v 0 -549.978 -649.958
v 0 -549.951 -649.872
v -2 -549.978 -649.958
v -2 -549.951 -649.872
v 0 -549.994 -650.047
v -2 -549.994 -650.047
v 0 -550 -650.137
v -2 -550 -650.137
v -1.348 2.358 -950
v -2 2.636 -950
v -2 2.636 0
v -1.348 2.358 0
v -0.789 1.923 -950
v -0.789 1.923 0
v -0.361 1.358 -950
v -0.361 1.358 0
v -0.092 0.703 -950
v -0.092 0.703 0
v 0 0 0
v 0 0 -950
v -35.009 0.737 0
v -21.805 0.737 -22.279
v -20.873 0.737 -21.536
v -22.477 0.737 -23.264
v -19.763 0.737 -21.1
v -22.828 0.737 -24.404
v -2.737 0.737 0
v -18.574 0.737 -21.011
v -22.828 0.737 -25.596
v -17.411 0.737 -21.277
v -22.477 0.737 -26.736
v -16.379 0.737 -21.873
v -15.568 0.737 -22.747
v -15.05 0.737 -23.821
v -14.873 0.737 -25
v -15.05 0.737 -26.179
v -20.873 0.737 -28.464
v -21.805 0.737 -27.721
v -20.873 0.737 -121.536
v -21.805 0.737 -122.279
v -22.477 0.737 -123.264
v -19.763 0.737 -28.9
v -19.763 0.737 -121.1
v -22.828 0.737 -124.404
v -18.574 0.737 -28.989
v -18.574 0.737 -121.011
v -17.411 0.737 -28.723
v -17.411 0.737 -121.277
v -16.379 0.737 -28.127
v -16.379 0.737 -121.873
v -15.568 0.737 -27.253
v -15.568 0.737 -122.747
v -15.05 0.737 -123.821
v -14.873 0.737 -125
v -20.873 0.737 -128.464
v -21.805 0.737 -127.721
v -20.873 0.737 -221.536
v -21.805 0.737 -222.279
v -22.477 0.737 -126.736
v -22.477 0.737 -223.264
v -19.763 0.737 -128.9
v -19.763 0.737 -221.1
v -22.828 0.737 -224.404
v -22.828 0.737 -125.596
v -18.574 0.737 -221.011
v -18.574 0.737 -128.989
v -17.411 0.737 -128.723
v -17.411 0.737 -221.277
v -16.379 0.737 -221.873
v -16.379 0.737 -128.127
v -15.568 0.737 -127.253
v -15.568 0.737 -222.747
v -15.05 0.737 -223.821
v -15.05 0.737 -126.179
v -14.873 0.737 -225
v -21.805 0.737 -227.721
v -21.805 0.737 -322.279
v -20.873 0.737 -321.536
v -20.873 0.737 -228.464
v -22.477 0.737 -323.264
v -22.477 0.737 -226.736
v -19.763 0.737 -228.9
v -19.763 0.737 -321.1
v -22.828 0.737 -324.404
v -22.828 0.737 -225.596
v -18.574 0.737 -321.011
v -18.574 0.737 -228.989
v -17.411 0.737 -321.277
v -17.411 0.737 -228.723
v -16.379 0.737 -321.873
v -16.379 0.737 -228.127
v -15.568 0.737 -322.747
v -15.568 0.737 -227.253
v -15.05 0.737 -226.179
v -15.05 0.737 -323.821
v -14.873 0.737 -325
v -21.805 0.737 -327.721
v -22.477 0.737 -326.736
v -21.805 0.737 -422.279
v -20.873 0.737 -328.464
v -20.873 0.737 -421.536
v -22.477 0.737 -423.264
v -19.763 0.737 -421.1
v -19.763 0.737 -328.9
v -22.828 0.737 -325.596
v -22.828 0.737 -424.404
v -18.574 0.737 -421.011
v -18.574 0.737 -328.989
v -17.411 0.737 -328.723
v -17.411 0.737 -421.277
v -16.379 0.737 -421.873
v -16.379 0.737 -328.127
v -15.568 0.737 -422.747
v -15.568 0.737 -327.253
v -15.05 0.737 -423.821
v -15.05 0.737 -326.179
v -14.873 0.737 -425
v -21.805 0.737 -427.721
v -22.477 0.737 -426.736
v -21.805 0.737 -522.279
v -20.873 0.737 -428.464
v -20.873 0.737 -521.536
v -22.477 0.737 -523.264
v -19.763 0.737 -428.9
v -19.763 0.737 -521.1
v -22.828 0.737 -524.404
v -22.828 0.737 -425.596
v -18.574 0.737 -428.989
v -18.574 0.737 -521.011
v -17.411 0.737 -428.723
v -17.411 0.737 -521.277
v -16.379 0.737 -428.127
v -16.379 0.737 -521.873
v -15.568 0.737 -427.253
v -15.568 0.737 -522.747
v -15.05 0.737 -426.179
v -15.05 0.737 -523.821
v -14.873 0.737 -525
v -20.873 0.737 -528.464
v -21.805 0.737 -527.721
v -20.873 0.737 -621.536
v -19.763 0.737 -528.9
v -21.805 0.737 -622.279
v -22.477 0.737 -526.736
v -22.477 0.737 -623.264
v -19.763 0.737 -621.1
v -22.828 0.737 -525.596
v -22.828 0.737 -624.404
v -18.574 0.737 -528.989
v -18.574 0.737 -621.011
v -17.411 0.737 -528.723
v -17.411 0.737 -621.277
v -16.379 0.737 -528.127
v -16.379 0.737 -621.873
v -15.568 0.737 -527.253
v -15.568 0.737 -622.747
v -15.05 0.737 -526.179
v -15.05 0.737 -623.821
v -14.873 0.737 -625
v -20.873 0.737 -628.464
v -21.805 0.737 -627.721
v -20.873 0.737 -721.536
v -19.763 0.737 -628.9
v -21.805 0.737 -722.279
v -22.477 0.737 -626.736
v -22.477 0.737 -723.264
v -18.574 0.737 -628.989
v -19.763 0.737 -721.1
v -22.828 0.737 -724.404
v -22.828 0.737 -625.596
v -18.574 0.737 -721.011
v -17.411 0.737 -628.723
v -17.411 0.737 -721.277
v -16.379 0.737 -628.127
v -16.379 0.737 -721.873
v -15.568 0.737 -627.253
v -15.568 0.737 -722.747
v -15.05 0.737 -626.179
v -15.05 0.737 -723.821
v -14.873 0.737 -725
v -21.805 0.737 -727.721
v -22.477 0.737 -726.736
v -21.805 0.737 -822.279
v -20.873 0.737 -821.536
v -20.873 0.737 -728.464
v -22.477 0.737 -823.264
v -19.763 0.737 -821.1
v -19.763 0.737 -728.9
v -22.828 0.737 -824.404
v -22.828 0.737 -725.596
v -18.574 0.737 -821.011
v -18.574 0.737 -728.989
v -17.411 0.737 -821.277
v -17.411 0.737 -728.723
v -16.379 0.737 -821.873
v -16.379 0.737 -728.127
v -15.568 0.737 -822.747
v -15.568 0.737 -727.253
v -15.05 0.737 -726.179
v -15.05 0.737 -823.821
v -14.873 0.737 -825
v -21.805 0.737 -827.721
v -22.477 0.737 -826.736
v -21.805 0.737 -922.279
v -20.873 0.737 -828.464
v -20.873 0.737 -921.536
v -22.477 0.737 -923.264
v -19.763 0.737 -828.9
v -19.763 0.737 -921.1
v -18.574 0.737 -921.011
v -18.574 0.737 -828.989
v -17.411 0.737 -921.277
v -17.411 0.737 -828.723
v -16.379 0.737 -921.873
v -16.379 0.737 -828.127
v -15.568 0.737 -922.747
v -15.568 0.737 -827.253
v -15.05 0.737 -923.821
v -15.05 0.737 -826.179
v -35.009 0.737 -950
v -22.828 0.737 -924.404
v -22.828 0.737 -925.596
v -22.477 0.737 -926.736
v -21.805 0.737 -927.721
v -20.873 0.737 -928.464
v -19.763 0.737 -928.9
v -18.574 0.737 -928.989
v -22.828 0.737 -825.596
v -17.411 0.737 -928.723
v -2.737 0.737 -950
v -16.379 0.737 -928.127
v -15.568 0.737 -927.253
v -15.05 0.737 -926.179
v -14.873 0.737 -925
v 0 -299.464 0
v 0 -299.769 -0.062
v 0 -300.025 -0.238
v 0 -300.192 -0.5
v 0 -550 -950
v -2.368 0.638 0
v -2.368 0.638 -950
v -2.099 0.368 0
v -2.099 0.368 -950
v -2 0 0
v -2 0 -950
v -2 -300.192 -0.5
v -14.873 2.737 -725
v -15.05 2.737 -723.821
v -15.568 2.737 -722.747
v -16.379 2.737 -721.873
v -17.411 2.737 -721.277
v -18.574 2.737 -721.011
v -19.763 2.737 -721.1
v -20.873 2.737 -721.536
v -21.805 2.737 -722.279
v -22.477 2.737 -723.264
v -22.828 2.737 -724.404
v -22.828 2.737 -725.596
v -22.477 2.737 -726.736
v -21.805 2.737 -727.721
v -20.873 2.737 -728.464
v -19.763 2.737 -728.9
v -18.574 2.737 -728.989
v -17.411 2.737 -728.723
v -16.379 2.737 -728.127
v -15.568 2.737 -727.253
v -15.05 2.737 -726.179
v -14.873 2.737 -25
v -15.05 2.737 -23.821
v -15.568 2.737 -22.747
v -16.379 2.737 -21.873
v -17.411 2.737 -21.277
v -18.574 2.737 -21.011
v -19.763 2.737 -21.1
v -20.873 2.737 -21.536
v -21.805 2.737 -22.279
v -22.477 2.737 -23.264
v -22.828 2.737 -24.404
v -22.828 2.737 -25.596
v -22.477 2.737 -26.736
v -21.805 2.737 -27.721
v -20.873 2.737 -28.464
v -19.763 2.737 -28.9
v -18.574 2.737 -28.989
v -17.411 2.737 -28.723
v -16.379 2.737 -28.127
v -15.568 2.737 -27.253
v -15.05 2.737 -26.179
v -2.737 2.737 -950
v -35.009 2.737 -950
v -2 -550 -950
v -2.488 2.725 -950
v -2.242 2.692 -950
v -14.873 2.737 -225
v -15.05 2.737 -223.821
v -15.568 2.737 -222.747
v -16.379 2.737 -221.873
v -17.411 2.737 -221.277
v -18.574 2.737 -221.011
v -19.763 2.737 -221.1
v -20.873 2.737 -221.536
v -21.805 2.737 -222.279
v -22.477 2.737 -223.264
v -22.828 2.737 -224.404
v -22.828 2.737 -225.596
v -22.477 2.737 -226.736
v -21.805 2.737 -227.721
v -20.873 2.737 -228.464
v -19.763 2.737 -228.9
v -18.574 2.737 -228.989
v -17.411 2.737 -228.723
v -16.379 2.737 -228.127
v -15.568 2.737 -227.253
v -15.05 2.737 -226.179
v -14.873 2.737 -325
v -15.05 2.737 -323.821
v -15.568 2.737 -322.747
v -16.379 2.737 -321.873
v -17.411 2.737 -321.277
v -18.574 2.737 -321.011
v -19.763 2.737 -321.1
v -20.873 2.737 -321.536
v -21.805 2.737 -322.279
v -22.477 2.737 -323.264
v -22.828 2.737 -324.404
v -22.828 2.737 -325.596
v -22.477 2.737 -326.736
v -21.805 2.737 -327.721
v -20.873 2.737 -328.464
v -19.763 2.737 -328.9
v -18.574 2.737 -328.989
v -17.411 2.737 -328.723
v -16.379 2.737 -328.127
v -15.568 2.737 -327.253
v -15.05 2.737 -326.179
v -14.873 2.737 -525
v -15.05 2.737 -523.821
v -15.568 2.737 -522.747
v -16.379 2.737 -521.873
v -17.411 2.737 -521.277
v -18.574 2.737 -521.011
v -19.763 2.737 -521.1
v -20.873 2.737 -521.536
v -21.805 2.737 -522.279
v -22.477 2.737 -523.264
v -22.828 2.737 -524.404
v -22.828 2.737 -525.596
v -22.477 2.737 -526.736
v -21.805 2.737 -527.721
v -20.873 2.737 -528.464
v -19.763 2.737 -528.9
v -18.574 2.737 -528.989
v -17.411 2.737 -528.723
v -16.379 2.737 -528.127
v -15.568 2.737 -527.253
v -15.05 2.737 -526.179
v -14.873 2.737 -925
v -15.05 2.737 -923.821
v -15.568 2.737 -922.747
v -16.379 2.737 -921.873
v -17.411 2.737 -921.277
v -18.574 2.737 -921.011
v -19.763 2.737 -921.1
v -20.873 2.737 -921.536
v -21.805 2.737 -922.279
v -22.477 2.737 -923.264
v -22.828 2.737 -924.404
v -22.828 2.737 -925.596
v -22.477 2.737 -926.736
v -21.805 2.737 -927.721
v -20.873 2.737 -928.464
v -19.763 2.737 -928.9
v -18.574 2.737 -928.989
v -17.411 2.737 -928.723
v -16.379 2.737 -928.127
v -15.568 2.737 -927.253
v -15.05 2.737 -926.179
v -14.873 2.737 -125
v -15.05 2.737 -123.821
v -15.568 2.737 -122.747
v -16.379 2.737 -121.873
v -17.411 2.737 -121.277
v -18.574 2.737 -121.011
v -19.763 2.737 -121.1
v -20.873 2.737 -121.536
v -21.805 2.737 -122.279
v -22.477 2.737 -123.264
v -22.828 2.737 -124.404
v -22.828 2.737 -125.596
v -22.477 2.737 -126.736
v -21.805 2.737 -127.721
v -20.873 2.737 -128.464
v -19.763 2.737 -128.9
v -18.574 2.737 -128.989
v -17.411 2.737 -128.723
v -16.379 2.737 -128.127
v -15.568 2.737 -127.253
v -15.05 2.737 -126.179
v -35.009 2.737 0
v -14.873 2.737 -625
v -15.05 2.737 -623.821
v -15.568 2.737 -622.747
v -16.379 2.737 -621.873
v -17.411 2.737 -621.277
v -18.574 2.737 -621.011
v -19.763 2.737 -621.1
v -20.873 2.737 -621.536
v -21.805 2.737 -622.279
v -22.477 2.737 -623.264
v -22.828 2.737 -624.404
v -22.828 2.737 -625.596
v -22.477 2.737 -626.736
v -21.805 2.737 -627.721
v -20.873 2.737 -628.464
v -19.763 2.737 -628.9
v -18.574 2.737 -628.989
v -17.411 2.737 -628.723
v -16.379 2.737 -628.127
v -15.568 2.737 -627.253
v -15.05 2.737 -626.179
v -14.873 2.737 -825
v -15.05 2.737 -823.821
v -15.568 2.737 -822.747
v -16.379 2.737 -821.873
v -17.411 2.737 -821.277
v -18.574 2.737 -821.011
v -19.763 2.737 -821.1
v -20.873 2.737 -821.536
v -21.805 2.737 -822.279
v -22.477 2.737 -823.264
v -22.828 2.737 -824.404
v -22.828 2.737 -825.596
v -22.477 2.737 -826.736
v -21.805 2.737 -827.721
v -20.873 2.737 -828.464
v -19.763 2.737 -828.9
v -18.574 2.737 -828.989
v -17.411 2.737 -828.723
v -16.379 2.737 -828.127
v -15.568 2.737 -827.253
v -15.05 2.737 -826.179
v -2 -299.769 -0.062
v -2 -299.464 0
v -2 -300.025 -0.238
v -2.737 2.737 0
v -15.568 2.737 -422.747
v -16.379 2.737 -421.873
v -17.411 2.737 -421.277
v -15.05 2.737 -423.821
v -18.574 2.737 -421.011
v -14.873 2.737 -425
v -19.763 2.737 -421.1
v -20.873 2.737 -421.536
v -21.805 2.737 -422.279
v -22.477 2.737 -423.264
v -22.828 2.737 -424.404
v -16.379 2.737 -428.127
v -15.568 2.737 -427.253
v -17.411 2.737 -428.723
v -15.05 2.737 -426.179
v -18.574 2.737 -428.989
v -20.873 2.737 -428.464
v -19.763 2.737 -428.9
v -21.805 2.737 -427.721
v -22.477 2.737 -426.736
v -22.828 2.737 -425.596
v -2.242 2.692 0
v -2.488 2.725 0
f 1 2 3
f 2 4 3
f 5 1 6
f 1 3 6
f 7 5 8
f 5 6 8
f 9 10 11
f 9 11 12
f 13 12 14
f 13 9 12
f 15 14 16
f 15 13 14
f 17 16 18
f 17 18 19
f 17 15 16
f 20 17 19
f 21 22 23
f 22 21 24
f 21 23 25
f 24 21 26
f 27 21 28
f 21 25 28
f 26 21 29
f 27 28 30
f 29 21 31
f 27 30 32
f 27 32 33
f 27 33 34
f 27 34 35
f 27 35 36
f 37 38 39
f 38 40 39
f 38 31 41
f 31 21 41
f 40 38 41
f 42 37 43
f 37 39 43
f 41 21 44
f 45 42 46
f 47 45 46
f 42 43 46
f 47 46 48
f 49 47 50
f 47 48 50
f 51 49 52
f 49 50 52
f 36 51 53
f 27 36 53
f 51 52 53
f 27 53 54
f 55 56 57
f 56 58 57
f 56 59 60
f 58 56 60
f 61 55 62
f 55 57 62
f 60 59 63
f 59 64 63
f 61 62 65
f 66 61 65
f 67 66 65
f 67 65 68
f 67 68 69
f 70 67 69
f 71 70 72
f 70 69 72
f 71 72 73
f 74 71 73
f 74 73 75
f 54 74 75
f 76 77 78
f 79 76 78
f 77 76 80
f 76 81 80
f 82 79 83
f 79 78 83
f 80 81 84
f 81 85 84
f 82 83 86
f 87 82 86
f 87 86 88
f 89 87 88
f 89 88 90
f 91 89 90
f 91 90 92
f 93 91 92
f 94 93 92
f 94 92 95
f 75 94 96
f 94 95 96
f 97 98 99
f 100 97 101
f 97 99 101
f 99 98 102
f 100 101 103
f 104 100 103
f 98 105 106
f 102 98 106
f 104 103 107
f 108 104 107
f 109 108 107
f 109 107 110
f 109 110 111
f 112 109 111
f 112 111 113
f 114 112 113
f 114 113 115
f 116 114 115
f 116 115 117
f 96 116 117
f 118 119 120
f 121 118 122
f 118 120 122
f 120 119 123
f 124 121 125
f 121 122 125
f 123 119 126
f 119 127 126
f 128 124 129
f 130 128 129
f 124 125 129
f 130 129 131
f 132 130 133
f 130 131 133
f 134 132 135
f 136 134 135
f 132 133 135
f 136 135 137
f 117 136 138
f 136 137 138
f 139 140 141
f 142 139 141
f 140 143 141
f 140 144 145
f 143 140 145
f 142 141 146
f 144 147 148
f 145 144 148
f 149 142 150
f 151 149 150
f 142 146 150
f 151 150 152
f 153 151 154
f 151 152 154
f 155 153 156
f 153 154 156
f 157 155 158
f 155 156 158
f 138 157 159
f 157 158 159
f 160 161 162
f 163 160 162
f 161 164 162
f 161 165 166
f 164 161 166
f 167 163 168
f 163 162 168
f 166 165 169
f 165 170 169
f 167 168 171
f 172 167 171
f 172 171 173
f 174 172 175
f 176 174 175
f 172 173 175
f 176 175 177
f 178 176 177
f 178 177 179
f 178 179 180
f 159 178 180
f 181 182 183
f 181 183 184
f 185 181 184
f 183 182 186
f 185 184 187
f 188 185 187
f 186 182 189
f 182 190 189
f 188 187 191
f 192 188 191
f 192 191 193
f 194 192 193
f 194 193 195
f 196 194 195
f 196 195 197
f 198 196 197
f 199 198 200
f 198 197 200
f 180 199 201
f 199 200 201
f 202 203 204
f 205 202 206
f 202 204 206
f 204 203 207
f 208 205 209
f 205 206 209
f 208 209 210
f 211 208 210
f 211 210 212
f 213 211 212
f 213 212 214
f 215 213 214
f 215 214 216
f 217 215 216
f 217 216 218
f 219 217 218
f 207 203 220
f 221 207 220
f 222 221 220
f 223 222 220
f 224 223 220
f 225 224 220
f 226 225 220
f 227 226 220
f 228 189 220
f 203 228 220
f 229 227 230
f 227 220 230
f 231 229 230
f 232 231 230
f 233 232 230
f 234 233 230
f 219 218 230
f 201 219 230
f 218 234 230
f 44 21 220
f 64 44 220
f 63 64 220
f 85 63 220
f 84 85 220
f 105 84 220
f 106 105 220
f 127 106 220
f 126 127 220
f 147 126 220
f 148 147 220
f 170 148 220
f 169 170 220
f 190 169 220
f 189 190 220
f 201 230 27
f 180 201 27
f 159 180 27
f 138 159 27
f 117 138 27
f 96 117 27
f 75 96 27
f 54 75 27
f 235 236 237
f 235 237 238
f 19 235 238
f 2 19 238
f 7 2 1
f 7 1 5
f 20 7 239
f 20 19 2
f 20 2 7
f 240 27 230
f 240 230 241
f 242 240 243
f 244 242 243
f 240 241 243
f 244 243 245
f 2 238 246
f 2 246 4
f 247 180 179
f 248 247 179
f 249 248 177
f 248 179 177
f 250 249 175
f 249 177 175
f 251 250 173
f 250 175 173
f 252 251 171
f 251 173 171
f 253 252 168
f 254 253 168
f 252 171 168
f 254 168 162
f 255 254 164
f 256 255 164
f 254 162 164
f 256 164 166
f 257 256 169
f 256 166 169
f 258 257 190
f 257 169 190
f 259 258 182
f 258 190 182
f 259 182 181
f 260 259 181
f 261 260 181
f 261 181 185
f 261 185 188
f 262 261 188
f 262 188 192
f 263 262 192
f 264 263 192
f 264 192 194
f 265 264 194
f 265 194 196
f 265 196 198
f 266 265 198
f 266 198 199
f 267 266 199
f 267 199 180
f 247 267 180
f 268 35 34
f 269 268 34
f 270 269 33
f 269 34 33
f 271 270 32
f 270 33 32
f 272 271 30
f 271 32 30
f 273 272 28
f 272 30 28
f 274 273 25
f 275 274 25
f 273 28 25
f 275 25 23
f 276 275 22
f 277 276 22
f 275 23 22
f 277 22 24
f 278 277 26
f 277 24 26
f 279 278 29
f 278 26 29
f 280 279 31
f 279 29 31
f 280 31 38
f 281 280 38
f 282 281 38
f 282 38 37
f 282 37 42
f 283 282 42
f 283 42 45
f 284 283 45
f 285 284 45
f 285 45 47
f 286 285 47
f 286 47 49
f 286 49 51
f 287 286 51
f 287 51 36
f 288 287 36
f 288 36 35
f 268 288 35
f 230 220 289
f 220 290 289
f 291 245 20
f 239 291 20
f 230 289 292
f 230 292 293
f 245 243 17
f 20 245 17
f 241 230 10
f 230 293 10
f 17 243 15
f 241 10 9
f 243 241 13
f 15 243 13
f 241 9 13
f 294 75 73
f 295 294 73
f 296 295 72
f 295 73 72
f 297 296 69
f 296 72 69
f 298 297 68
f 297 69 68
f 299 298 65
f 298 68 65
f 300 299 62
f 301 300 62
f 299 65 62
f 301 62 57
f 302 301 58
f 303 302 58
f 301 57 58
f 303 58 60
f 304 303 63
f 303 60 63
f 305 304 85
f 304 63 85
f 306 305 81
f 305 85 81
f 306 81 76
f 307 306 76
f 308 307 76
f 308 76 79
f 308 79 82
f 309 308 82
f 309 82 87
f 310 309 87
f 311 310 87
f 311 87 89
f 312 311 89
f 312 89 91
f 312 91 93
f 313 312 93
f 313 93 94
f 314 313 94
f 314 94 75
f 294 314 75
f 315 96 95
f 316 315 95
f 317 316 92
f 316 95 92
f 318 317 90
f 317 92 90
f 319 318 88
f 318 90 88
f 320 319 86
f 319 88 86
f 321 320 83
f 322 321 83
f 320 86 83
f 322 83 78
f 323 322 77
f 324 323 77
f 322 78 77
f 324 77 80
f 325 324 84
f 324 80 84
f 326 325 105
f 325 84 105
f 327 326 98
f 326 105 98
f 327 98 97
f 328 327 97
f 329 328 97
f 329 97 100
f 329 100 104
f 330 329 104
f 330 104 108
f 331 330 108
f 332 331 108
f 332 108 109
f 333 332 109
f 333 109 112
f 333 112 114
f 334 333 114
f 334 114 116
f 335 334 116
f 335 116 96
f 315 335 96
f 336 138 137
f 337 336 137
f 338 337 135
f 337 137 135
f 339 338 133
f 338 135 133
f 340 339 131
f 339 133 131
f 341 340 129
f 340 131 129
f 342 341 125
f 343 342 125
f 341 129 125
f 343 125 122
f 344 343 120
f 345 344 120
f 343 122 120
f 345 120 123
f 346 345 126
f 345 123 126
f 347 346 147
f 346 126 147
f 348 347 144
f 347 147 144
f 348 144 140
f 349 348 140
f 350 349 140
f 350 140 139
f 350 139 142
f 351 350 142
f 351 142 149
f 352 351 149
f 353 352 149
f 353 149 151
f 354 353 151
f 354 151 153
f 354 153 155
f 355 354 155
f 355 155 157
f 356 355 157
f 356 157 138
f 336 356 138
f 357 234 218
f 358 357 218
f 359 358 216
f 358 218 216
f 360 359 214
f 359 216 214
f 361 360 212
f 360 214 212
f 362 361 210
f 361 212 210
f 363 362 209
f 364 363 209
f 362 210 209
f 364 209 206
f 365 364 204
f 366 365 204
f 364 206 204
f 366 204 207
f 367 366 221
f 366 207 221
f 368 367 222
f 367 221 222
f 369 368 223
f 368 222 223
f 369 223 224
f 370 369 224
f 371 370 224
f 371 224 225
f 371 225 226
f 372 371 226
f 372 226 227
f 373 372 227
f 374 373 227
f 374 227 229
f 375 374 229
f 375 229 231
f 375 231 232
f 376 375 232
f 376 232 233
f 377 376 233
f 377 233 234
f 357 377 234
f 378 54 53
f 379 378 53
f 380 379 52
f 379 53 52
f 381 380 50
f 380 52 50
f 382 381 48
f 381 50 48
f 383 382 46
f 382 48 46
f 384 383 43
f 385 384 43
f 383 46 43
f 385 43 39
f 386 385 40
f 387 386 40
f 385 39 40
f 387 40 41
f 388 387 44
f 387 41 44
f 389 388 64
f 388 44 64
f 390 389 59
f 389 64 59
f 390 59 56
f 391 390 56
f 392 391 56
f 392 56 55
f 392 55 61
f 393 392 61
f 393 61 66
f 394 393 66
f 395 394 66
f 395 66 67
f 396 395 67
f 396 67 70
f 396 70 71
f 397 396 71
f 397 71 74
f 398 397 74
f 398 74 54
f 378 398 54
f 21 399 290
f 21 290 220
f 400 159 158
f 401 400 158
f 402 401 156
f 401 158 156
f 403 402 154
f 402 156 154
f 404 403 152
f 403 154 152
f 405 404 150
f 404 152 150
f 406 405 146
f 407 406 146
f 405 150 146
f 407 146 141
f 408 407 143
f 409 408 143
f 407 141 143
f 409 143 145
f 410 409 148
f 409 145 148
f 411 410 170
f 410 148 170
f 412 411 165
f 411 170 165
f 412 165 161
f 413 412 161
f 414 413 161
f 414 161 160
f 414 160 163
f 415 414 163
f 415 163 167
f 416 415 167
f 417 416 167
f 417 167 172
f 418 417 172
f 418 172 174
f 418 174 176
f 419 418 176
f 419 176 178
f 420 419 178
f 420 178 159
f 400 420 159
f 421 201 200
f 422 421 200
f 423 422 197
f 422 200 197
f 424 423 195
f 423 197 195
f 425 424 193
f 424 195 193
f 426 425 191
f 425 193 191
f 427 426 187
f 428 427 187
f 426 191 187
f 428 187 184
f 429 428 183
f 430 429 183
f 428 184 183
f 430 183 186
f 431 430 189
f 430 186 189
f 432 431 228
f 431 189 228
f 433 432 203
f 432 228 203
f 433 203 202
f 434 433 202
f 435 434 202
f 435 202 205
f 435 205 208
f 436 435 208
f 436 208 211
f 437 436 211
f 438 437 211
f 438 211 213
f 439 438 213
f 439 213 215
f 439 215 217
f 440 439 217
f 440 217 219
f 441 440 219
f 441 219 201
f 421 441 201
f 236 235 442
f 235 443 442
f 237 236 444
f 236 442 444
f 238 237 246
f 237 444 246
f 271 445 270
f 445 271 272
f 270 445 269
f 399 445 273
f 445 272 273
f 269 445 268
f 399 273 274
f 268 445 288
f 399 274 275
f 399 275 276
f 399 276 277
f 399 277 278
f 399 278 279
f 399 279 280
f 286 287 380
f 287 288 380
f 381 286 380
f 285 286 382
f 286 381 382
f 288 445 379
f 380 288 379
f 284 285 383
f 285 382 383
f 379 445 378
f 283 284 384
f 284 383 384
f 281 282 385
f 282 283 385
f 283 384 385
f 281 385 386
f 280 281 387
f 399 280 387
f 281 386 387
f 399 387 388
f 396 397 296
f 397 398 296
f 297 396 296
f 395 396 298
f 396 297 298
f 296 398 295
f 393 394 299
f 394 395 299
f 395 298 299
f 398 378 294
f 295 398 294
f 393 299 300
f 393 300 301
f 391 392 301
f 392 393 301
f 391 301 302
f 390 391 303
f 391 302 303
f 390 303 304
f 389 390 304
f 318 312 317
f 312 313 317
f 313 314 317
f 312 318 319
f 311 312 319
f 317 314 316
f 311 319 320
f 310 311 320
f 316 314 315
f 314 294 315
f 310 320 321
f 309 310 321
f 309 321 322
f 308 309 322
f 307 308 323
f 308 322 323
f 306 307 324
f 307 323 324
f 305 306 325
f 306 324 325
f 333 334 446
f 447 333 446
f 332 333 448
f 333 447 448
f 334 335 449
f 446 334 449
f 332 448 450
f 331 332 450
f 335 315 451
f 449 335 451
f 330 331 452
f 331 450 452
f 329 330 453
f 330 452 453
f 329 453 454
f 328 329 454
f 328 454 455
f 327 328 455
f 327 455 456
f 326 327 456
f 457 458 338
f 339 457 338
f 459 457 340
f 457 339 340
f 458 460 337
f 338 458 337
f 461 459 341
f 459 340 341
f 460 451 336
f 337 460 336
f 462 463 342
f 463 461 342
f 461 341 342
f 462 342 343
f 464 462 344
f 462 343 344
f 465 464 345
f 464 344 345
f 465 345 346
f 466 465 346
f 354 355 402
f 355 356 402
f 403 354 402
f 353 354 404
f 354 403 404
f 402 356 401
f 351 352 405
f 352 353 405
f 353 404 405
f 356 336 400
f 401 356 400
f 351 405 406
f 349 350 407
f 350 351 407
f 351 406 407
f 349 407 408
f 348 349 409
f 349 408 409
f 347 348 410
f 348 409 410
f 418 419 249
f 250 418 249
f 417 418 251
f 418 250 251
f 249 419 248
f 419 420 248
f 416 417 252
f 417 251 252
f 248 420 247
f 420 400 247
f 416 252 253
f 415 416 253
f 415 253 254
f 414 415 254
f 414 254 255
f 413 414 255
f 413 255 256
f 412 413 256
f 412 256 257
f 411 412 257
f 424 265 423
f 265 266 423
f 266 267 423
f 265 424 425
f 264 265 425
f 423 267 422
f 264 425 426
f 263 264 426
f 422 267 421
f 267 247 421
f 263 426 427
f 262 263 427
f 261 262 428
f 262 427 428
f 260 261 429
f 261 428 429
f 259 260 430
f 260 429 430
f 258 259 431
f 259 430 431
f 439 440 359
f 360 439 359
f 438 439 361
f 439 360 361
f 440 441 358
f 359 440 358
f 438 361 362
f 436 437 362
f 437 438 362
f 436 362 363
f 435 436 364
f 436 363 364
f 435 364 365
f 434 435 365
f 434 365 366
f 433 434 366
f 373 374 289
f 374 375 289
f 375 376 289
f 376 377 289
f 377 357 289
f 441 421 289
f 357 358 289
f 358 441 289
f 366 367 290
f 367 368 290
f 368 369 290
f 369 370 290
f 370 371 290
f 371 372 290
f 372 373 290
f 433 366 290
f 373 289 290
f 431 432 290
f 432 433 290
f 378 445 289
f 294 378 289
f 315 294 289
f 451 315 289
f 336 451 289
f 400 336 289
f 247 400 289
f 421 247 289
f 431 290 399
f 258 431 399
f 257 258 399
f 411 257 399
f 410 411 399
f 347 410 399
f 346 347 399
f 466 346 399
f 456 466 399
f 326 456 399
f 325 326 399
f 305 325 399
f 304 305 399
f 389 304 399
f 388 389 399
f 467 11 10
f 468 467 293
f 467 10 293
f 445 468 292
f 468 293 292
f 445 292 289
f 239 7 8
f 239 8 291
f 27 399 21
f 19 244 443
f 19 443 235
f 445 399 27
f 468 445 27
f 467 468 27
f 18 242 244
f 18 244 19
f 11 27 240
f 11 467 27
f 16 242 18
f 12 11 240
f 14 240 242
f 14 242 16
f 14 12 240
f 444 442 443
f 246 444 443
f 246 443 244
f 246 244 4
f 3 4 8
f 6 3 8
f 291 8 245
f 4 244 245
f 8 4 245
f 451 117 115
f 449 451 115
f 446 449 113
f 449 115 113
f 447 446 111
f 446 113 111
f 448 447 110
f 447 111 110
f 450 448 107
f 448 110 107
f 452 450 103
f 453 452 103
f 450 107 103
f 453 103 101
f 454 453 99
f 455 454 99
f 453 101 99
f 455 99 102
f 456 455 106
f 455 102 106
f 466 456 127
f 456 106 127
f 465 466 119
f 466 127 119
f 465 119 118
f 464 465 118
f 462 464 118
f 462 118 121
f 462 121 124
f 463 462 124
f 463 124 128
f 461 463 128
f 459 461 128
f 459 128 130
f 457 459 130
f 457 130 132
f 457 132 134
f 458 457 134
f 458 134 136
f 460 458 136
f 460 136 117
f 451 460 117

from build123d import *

# Parameters (mm, degrees)
BASE_FLANGE1_DEPTH     = 2
TAB1_START             = -2
TAB1_OUTLINE_W         = 950
TAB1_OUTLINE_H         = 35
TAB1_DEPTH             = 2
SKETCHED_START         = -950
SKETCHED_BEND1_DEPTH   = 950
SKETCHED_BEND1_2_DEPTH = 950
FILLET1_R              = 0.78
FILLET2_R              = 0.74
SKETCH10_R             = 4
CUT_EXTRUDE1_DEPTH     = 10


# Read off the part's stored shape, not the designer's step: Tab1, Sketched Bend1
# Sheet-metal steps are written as plain solids
with BuildPart() as part:
    # Sketch1 → Base-Flange1 (new body)
    with BuildSketch(Plane(origin=(0, 0, 0), x_dir=(0, 0, -1), z_dir=(1, 0, 0))):
        Polygon((0, 0), (0, -300), (650, -550), (950, -550), (950, 0), align=None)
    extrude(amount=-BASE_FLANGE1_DEPTH)

    # Tab1 outline → Tab1 (add)
    with BuildSketch(Plane(origin=(0, 0, 0), x_dir=(0, 0, -1), z_dir=(1, 0, 0)).offset(TAB1_START)):
        with Locations((475, 17.5)):
            Rectangle(TAB1_OUTLINE_W, TAB1_OUTLINE_H)
    extrude(amount=TAB1_DEPTH)

    # Sketched Bend1 outline → Sketched Bend1 (cut)
    with BuildSketch(Plane.XY.offset(SKETCHED_START)):
        with BuildLine():
            Line((-2, 35), (-2, 2.635602398))
            ThreePointArc((-2, 2.635602398), (-0.556604688, 1.654267209), (0, 0))
            Line((0, 0), (0, 35))
            Line((0, 35), (-2, 35))
        make_face()
    extrude(amount=SKETCHED_BEND1_DEPTH, mode=Mode.SUBTRACT)

    # Sketched Bend1 2 outline → Sketched Bend1 2 (add)
    with BuildSketch(Plane.XY.offset(SKETCHED_START)):
        with BuildLine():
            Line((-35.008755099, 0.7366), (-2.7366, 0.7366))
            ThreePointArc((-2.7366, 0.7366), (-2.215745145, 0.520854855), (-2, 0))
            Line((-2, 0), (-2, 2.635602398))
            ThreePointArc((-2, 2.635602398), (-2.364854094, 2.711233029), (-2.7366, 2.7366))
            Line((-2.7366, 2.7366), (-35.008755099, 2.7366))
            Line((-35.008755099, 2.7366), (-35.008755099, 0.7366))
        make_face()
    extrude(amount=SKETCHED_BEND1_2_DEPTH)

    # Fillet1
    fillet1_edges = [part.edges().sort_by_distance(p)[0] for p in [
        (-1, -300, 0),
    ]]
    fillet(fillet1_edges, radius=FILLET1_R)

    # Fillet2
    fillet2_edges = [part.edges().sort_by_distance(p)[0] for p in [
        (-1, -550, -650),
    ]]
    fillet(fillet2_edges, radius=FILLET2_R)

    # Sketch10 → Cut-Extrude1 (cut)
    with BuildSketch(Plane.XZ.offset(-0.7366)):
        with Locations((-18.872677549, -25)):
            Circle(SKETCH10_R)
        with Locations((-18.872677549, -125)):
            Circle(SKETCH10_R)
        with Locations((-18.872677549, -225)):
            Circle(SKETCH10_R)
        with Locations((-18.872677549, -325)):
            Circle(SKETCH10_R)
        with Locations((-18.872677549, -425)):
            Circle(SKETCH10_R)
        with Locations((-18.872677549, -525)):
            Circle(SKETCH10_R)
        with Locations((-18.872677549, -625)):
            Circle(SKETCH10_R)
        with Locations((-18.872677549, -725)):
            Circle(SKETCH10_R)
        with Locations((-18.872677549, -825)):
            Circle(SKETCH10_R)
        with Locations((-18.872677549, -925)):
            Circle(SKETCH10_R)
    extrude(amount=-CUT_EXTRUDE1_DEPTH, mode=Mode.SUBTRACT)


solid = part.part
